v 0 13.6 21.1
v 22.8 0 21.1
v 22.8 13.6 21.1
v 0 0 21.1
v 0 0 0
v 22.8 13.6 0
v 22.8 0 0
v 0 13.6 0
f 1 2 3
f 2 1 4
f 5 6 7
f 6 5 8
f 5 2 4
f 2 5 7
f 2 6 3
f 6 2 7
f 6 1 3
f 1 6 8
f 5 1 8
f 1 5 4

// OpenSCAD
module batt(top_width, top_depth, bottom_width, bottom_depth, height){
    
    cube([top_width, top_depth, height]);
}

batt(22.8, 13.6, 22.8, 13.2, 21.1);
